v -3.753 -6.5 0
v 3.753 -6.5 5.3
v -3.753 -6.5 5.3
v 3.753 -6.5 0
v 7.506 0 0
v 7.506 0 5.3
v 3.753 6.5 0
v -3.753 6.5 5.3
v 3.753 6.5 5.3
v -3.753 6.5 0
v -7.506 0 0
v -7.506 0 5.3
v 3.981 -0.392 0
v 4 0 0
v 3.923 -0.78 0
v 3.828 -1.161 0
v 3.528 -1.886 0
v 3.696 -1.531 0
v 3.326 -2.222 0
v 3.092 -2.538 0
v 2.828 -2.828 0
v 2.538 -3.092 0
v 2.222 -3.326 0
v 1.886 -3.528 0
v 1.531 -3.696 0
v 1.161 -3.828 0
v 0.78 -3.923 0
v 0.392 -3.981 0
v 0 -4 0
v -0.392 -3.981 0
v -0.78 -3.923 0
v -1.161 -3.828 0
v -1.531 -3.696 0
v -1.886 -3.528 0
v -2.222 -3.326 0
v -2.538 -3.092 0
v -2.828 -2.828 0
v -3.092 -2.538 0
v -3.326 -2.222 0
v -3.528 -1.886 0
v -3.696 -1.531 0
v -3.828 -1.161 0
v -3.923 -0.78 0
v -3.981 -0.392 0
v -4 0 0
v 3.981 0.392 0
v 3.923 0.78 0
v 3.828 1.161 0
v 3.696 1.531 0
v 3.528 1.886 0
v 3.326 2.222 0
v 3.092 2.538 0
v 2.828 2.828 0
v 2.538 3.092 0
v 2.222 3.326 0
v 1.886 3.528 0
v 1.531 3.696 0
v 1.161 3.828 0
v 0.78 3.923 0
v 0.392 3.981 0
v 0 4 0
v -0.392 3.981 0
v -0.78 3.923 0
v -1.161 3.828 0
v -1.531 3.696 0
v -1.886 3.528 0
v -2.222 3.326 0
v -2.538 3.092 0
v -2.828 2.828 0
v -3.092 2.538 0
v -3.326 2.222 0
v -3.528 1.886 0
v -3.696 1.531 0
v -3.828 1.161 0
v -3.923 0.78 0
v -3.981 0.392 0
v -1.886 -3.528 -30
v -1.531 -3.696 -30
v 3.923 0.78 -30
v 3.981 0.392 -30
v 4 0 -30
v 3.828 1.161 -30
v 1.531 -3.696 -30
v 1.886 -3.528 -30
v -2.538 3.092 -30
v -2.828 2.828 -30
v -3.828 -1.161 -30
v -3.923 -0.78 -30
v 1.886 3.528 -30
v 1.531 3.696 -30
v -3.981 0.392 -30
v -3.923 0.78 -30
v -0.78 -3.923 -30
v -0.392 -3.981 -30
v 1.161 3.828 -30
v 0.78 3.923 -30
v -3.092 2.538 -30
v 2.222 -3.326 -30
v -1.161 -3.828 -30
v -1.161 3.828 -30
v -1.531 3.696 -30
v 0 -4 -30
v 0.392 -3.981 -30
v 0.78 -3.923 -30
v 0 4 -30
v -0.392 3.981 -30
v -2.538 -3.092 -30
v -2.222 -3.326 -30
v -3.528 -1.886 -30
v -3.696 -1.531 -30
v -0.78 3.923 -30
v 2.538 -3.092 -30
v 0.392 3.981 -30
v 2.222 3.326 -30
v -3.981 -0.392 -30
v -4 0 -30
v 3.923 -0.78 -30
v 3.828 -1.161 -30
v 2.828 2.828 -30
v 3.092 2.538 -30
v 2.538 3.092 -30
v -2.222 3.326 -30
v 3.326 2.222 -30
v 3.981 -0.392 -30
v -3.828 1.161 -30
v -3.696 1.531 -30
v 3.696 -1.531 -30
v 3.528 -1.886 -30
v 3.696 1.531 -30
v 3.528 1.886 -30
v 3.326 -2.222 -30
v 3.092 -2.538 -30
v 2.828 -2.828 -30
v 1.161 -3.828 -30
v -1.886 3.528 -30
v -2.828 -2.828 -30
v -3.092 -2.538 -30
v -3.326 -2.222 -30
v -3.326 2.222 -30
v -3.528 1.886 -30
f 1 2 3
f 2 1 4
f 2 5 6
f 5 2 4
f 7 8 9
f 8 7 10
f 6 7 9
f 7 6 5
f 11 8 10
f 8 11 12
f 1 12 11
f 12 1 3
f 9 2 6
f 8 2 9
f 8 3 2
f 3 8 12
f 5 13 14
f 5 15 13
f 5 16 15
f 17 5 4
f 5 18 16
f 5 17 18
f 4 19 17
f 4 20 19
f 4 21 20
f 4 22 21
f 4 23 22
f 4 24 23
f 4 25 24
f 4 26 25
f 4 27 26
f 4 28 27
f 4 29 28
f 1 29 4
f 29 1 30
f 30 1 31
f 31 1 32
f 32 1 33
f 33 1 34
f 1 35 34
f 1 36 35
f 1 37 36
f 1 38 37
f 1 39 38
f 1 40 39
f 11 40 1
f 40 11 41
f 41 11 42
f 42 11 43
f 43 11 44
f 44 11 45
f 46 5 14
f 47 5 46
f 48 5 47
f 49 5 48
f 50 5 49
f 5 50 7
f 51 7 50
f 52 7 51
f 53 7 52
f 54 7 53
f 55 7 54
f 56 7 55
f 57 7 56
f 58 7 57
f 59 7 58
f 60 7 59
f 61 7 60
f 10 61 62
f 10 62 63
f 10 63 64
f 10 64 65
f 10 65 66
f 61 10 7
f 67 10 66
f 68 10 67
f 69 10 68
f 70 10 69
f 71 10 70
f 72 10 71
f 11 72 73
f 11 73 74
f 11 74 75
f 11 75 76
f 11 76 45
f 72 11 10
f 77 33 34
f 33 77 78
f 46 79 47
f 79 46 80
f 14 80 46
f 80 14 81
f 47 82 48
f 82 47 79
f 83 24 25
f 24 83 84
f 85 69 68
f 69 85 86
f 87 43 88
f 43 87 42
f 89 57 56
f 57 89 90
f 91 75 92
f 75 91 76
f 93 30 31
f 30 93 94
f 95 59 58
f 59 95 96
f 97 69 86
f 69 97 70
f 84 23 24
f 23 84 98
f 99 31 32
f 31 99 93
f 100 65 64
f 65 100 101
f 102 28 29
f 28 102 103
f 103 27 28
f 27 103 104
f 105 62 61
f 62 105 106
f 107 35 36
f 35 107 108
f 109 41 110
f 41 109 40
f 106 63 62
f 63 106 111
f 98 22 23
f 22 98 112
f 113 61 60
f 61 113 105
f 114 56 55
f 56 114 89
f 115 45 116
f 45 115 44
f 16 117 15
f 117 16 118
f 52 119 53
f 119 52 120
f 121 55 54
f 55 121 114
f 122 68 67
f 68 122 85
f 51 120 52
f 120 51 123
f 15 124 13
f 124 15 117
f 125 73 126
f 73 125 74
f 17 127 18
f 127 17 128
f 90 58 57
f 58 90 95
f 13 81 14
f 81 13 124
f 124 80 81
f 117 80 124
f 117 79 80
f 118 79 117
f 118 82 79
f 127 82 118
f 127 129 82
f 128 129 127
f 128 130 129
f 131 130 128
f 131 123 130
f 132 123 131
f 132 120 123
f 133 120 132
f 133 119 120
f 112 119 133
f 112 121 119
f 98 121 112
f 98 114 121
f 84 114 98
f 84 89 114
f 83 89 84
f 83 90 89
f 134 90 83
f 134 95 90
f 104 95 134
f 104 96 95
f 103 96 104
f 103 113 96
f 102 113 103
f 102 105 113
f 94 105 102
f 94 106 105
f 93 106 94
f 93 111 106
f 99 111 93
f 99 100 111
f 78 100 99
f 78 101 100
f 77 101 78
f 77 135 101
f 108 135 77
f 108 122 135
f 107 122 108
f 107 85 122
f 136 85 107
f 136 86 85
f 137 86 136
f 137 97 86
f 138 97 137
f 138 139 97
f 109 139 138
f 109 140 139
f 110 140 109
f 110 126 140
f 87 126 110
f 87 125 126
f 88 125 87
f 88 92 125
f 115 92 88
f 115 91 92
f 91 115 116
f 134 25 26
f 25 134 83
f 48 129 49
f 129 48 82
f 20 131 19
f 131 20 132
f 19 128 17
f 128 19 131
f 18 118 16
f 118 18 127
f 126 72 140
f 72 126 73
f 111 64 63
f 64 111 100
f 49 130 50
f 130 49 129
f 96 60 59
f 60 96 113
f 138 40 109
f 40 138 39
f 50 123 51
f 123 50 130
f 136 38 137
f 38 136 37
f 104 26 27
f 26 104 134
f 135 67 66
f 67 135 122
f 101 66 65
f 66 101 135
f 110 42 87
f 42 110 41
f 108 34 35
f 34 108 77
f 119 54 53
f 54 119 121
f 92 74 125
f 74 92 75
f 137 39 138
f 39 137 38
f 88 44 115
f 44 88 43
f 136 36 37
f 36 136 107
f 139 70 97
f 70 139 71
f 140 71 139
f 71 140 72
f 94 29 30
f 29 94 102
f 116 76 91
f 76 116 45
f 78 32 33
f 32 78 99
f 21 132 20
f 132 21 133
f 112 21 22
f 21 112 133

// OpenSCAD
// M8 六角ボルト（ねじ山省略）

across_flats = 13;
head_height  = 5.3;
shank_diameter = 8;
shank_length   = 30;

// 六角形の外接円半径: 対辺距離 / √3
head_radius = across_flats / sqrt(3);

union() {
    // 頭部：底面 z=0、+Z 方向へ高さ 5.3 mm
    cylinder(
        h = head_height,
        r = head_radius,
        $fn = 6
    );

    // シャンク：頭部底面から -Z 方向へ 30 mm
    translate([0, 0, -shank_length])
        cylinder(
            h = shank_length,
            d = shank_diameter,
            $fn = 64
        );
}
